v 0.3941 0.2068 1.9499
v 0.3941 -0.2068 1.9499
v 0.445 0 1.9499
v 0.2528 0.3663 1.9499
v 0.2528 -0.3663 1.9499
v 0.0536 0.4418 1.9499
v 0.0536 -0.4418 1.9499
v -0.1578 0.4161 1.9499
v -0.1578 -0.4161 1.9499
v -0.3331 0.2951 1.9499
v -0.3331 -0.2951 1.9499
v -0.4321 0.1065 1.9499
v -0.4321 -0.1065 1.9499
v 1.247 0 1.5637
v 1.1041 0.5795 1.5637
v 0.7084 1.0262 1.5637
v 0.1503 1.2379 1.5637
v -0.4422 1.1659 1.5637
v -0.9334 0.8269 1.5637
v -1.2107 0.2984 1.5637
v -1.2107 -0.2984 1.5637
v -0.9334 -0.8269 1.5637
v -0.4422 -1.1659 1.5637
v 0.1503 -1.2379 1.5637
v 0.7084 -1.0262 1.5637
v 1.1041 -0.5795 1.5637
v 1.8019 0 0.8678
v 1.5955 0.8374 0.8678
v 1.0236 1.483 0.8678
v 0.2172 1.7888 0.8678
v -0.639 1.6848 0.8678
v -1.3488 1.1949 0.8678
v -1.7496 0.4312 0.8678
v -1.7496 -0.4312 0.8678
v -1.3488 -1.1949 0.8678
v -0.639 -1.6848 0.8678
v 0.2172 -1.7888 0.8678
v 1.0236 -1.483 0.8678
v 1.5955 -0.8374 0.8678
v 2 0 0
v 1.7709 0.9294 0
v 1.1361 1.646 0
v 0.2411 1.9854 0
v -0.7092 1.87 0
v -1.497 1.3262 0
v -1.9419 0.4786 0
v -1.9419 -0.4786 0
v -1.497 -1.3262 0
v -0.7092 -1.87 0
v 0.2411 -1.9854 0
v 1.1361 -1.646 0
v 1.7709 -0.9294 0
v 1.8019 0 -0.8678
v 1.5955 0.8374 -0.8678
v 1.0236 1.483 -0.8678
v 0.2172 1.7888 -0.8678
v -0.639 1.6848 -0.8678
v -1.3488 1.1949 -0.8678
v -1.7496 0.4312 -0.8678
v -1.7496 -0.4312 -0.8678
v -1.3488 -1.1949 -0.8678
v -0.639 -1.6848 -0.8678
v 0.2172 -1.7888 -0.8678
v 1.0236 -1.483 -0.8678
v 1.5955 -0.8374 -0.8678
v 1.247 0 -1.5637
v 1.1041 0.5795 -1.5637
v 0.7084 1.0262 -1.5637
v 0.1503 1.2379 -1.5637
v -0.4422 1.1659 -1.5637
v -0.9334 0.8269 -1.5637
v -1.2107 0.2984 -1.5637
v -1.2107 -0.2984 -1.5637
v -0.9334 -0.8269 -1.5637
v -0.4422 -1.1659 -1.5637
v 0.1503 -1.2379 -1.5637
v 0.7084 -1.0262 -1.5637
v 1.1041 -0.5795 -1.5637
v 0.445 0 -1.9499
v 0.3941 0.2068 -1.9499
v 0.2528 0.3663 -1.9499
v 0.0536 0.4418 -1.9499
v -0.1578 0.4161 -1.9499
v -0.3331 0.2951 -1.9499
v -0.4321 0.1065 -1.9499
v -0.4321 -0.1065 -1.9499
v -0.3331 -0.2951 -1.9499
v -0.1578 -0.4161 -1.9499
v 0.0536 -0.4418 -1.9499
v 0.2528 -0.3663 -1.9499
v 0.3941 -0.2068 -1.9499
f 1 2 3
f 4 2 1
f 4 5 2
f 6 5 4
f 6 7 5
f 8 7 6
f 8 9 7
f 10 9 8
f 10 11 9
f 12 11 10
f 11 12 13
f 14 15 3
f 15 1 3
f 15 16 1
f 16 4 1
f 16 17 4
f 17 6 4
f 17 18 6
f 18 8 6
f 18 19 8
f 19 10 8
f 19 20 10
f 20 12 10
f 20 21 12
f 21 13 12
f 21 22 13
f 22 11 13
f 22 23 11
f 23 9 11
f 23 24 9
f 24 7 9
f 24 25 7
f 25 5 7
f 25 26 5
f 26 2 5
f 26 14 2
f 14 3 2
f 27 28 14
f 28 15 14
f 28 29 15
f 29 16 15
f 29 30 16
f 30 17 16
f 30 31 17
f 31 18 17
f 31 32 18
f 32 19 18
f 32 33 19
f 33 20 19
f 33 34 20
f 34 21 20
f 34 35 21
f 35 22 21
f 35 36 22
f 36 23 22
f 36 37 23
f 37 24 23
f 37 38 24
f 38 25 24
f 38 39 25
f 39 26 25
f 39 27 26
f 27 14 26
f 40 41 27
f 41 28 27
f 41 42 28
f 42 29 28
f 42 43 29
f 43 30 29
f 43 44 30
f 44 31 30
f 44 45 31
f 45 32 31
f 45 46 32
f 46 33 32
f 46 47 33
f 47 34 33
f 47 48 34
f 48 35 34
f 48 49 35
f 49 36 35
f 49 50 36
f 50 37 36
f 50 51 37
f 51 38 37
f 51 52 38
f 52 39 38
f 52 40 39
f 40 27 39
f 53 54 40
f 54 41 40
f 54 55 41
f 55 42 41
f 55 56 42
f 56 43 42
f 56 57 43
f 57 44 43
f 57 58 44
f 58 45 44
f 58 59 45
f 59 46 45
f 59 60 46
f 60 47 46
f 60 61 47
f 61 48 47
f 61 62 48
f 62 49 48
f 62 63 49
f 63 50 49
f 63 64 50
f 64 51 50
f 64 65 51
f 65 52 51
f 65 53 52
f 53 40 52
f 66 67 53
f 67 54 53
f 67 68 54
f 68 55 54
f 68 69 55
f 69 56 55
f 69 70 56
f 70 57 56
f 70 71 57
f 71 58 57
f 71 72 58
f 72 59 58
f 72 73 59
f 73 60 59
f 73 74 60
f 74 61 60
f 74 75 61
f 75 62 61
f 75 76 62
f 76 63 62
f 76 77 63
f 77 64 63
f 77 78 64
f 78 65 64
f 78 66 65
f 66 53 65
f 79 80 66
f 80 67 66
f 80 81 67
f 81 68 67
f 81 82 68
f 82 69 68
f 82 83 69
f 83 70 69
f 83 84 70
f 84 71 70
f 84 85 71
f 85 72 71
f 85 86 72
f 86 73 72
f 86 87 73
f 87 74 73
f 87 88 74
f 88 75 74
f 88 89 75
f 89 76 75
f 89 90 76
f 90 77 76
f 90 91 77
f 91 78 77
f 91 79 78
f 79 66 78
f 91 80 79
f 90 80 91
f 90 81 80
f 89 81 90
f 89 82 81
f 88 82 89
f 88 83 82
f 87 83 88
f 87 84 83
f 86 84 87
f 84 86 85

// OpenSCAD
//Spehrical to rectangular coordinate converter (r,theta,zenit)
function spher_rect(r,theta,zenit) = 
[ r*(sin(theta)*cos(zenit)) , r*(sin(theta)*sin(zenit)), r*cos(theta) ];

rad = 50;
the= 180*$t;
rot= 360*((-cos(180*$t))-1);

steps=floor(100*$t);


for(i=[0:steps]) {
 translate(spher_rect(rad,the*(i/steps),360*((-cos(180*$t))-1)*(i/steps))) 
    sphere(r=2,$fs=1);
}
